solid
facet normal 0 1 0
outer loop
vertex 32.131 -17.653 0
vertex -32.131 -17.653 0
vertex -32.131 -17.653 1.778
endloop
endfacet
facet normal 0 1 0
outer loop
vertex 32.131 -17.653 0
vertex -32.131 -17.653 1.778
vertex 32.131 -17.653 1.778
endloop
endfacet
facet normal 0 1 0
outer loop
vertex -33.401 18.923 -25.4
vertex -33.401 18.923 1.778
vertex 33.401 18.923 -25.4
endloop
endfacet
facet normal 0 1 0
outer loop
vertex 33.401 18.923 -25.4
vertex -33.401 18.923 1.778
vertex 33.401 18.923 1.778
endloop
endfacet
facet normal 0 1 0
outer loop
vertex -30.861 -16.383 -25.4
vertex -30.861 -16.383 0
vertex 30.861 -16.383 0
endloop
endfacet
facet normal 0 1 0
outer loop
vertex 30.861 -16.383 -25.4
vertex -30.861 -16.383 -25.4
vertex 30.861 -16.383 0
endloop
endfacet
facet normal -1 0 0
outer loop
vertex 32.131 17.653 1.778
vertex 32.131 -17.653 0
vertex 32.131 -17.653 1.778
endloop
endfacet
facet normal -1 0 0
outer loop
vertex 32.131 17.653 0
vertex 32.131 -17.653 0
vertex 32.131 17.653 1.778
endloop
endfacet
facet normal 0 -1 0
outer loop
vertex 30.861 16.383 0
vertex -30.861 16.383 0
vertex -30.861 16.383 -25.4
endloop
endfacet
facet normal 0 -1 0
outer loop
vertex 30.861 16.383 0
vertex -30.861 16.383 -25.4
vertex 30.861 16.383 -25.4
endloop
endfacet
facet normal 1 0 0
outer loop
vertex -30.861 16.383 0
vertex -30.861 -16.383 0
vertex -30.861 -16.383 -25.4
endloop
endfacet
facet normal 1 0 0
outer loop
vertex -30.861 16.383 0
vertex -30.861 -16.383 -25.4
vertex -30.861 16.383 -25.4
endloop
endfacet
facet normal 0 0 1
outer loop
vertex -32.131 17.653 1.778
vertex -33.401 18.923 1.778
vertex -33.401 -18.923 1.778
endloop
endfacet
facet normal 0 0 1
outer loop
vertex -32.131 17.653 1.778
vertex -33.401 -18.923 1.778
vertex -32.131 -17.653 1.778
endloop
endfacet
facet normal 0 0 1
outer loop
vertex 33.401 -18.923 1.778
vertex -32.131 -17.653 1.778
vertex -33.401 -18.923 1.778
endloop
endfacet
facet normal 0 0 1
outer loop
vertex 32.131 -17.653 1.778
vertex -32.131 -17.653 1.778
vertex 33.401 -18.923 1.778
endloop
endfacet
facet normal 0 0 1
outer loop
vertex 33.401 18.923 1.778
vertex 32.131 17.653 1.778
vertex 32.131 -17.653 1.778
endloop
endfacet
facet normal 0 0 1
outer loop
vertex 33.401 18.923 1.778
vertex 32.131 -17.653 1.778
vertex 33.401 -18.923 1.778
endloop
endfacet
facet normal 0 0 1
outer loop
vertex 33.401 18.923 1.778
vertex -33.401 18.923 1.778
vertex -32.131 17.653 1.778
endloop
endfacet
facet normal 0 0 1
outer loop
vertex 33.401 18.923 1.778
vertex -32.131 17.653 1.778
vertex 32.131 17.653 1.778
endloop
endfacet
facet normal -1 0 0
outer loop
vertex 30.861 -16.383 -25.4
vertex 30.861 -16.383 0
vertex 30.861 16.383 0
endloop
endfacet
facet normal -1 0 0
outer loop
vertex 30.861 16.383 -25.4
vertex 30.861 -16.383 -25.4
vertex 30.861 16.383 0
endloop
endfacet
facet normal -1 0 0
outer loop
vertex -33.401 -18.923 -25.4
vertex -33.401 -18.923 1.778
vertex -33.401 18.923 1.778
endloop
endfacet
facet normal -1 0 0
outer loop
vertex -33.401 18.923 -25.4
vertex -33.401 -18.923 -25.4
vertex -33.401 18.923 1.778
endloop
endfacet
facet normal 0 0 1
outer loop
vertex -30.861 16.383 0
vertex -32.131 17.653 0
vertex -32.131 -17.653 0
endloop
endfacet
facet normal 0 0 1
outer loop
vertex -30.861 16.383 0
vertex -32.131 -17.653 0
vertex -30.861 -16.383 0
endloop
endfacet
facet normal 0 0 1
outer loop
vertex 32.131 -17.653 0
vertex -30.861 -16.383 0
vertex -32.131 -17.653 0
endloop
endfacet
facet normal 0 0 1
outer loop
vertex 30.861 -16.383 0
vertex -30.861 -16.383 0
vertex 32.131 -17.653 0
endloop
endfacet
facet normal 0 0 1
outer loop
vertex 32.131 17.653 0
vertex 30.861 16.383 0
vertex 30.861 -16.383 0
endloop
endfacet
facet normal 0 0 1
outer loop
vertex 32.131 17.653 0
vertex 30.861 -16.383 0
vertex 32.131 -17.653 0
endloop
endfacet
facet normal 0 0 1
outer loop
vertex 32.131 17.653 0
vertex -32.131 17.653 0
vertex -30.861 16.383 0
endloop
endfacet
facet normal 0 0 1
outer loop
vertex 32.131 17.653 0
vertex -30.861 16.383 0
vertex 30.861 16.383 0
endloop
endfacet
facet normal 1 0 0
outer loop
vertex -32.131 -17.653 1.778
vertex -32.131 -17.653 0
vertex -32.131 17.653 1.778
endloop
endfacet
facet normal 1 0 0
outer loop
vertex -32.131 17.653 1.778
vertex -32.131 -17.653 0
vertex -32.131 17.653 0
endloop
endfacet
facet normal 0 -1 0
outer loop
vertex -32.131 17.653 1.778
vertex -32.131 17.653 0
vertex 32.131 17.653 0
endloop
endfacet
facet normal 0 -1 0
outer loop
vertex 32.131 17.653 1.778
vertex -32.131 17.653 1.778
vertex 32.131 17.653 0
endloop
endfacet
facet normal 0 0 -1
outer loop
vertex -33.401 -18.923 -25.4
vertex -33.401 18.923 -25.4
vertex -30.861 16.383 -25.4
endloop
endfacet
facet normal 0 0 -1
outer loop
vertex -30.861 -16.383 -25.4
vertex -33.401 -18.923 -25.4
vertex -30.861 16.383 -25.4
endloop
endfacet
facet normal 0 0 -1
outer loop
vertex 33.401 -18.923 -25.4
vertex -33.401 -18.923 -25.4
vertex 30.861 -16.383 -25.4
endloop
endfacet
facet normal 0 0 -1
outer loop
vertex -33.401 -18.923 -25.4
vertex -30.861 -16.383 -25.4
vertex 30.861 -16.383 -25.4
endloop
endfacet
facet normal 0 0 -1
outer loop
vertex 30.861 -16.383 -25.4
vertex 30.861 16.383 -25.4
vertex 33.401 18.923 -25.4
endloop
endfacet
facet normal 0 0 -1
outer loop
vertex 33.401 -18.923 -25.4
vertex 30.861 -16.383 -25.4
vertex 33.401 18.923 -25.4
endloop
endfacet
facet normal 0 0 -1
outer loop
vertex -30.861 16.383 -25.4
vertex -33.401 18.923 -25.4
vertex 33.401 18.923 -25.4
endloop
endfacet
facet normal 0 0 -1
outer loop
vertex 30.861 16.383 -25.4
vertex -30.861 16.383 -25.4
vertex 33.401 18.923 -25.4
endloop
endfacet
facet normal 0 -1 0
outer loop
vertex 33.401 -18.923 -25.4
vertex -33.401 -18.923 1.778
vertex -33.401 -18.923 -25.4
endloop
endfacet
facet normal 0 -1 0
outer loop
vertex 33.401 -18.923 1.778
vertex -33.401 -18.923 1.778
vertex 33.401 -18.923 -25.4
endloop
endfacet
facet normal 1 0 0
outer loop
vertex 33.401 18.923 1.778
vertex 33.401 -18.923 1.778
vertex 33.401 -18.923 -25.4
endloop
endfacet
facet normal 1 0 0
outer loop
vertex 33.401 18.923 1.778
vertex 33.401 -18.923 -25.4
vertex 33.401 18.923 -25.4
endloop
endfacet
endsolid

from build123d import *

# Parameters (mm, degrees)
F0_W          = 64.262
F0_H          = 35.306
F0_W_2        = 61.722
F0_H_2        = 32.766
F1_DEPTH      = 25.4
F2_W          = 66.802
F2_H          = 37.846
F2_W_2        = 64.262
F2_H_2        = 35.306
F3_DEPTH      = 1.778
F3_DEPTH_BACK = 25.4


with BuildPart() as f1:
    # F0 (on Top) → F1 (new body)
    with BuildSketch(Plane.XY):
        Rectangle(F0_W, F0_H)
        Rectangle(F0_W_2, F0_H_2, mode=Mode.SUBTRACT)
    extrude(amount=-F1_DEPTH)

    # F2 (on Top) → F3 (join, two sides)
    with BuildSketch(Plane.XY) as f3_sk:
        Rectangle(F2_W, F2_H)
        Rectangle(F2_W_2, F2_H_2, mode=Mode.SUBTRACT)
    extrude(amount=F3_DEPTH)
    extrude(f3_sk.sketch, amount=-F3_DEPTH_BACK)


solid = f1.part
